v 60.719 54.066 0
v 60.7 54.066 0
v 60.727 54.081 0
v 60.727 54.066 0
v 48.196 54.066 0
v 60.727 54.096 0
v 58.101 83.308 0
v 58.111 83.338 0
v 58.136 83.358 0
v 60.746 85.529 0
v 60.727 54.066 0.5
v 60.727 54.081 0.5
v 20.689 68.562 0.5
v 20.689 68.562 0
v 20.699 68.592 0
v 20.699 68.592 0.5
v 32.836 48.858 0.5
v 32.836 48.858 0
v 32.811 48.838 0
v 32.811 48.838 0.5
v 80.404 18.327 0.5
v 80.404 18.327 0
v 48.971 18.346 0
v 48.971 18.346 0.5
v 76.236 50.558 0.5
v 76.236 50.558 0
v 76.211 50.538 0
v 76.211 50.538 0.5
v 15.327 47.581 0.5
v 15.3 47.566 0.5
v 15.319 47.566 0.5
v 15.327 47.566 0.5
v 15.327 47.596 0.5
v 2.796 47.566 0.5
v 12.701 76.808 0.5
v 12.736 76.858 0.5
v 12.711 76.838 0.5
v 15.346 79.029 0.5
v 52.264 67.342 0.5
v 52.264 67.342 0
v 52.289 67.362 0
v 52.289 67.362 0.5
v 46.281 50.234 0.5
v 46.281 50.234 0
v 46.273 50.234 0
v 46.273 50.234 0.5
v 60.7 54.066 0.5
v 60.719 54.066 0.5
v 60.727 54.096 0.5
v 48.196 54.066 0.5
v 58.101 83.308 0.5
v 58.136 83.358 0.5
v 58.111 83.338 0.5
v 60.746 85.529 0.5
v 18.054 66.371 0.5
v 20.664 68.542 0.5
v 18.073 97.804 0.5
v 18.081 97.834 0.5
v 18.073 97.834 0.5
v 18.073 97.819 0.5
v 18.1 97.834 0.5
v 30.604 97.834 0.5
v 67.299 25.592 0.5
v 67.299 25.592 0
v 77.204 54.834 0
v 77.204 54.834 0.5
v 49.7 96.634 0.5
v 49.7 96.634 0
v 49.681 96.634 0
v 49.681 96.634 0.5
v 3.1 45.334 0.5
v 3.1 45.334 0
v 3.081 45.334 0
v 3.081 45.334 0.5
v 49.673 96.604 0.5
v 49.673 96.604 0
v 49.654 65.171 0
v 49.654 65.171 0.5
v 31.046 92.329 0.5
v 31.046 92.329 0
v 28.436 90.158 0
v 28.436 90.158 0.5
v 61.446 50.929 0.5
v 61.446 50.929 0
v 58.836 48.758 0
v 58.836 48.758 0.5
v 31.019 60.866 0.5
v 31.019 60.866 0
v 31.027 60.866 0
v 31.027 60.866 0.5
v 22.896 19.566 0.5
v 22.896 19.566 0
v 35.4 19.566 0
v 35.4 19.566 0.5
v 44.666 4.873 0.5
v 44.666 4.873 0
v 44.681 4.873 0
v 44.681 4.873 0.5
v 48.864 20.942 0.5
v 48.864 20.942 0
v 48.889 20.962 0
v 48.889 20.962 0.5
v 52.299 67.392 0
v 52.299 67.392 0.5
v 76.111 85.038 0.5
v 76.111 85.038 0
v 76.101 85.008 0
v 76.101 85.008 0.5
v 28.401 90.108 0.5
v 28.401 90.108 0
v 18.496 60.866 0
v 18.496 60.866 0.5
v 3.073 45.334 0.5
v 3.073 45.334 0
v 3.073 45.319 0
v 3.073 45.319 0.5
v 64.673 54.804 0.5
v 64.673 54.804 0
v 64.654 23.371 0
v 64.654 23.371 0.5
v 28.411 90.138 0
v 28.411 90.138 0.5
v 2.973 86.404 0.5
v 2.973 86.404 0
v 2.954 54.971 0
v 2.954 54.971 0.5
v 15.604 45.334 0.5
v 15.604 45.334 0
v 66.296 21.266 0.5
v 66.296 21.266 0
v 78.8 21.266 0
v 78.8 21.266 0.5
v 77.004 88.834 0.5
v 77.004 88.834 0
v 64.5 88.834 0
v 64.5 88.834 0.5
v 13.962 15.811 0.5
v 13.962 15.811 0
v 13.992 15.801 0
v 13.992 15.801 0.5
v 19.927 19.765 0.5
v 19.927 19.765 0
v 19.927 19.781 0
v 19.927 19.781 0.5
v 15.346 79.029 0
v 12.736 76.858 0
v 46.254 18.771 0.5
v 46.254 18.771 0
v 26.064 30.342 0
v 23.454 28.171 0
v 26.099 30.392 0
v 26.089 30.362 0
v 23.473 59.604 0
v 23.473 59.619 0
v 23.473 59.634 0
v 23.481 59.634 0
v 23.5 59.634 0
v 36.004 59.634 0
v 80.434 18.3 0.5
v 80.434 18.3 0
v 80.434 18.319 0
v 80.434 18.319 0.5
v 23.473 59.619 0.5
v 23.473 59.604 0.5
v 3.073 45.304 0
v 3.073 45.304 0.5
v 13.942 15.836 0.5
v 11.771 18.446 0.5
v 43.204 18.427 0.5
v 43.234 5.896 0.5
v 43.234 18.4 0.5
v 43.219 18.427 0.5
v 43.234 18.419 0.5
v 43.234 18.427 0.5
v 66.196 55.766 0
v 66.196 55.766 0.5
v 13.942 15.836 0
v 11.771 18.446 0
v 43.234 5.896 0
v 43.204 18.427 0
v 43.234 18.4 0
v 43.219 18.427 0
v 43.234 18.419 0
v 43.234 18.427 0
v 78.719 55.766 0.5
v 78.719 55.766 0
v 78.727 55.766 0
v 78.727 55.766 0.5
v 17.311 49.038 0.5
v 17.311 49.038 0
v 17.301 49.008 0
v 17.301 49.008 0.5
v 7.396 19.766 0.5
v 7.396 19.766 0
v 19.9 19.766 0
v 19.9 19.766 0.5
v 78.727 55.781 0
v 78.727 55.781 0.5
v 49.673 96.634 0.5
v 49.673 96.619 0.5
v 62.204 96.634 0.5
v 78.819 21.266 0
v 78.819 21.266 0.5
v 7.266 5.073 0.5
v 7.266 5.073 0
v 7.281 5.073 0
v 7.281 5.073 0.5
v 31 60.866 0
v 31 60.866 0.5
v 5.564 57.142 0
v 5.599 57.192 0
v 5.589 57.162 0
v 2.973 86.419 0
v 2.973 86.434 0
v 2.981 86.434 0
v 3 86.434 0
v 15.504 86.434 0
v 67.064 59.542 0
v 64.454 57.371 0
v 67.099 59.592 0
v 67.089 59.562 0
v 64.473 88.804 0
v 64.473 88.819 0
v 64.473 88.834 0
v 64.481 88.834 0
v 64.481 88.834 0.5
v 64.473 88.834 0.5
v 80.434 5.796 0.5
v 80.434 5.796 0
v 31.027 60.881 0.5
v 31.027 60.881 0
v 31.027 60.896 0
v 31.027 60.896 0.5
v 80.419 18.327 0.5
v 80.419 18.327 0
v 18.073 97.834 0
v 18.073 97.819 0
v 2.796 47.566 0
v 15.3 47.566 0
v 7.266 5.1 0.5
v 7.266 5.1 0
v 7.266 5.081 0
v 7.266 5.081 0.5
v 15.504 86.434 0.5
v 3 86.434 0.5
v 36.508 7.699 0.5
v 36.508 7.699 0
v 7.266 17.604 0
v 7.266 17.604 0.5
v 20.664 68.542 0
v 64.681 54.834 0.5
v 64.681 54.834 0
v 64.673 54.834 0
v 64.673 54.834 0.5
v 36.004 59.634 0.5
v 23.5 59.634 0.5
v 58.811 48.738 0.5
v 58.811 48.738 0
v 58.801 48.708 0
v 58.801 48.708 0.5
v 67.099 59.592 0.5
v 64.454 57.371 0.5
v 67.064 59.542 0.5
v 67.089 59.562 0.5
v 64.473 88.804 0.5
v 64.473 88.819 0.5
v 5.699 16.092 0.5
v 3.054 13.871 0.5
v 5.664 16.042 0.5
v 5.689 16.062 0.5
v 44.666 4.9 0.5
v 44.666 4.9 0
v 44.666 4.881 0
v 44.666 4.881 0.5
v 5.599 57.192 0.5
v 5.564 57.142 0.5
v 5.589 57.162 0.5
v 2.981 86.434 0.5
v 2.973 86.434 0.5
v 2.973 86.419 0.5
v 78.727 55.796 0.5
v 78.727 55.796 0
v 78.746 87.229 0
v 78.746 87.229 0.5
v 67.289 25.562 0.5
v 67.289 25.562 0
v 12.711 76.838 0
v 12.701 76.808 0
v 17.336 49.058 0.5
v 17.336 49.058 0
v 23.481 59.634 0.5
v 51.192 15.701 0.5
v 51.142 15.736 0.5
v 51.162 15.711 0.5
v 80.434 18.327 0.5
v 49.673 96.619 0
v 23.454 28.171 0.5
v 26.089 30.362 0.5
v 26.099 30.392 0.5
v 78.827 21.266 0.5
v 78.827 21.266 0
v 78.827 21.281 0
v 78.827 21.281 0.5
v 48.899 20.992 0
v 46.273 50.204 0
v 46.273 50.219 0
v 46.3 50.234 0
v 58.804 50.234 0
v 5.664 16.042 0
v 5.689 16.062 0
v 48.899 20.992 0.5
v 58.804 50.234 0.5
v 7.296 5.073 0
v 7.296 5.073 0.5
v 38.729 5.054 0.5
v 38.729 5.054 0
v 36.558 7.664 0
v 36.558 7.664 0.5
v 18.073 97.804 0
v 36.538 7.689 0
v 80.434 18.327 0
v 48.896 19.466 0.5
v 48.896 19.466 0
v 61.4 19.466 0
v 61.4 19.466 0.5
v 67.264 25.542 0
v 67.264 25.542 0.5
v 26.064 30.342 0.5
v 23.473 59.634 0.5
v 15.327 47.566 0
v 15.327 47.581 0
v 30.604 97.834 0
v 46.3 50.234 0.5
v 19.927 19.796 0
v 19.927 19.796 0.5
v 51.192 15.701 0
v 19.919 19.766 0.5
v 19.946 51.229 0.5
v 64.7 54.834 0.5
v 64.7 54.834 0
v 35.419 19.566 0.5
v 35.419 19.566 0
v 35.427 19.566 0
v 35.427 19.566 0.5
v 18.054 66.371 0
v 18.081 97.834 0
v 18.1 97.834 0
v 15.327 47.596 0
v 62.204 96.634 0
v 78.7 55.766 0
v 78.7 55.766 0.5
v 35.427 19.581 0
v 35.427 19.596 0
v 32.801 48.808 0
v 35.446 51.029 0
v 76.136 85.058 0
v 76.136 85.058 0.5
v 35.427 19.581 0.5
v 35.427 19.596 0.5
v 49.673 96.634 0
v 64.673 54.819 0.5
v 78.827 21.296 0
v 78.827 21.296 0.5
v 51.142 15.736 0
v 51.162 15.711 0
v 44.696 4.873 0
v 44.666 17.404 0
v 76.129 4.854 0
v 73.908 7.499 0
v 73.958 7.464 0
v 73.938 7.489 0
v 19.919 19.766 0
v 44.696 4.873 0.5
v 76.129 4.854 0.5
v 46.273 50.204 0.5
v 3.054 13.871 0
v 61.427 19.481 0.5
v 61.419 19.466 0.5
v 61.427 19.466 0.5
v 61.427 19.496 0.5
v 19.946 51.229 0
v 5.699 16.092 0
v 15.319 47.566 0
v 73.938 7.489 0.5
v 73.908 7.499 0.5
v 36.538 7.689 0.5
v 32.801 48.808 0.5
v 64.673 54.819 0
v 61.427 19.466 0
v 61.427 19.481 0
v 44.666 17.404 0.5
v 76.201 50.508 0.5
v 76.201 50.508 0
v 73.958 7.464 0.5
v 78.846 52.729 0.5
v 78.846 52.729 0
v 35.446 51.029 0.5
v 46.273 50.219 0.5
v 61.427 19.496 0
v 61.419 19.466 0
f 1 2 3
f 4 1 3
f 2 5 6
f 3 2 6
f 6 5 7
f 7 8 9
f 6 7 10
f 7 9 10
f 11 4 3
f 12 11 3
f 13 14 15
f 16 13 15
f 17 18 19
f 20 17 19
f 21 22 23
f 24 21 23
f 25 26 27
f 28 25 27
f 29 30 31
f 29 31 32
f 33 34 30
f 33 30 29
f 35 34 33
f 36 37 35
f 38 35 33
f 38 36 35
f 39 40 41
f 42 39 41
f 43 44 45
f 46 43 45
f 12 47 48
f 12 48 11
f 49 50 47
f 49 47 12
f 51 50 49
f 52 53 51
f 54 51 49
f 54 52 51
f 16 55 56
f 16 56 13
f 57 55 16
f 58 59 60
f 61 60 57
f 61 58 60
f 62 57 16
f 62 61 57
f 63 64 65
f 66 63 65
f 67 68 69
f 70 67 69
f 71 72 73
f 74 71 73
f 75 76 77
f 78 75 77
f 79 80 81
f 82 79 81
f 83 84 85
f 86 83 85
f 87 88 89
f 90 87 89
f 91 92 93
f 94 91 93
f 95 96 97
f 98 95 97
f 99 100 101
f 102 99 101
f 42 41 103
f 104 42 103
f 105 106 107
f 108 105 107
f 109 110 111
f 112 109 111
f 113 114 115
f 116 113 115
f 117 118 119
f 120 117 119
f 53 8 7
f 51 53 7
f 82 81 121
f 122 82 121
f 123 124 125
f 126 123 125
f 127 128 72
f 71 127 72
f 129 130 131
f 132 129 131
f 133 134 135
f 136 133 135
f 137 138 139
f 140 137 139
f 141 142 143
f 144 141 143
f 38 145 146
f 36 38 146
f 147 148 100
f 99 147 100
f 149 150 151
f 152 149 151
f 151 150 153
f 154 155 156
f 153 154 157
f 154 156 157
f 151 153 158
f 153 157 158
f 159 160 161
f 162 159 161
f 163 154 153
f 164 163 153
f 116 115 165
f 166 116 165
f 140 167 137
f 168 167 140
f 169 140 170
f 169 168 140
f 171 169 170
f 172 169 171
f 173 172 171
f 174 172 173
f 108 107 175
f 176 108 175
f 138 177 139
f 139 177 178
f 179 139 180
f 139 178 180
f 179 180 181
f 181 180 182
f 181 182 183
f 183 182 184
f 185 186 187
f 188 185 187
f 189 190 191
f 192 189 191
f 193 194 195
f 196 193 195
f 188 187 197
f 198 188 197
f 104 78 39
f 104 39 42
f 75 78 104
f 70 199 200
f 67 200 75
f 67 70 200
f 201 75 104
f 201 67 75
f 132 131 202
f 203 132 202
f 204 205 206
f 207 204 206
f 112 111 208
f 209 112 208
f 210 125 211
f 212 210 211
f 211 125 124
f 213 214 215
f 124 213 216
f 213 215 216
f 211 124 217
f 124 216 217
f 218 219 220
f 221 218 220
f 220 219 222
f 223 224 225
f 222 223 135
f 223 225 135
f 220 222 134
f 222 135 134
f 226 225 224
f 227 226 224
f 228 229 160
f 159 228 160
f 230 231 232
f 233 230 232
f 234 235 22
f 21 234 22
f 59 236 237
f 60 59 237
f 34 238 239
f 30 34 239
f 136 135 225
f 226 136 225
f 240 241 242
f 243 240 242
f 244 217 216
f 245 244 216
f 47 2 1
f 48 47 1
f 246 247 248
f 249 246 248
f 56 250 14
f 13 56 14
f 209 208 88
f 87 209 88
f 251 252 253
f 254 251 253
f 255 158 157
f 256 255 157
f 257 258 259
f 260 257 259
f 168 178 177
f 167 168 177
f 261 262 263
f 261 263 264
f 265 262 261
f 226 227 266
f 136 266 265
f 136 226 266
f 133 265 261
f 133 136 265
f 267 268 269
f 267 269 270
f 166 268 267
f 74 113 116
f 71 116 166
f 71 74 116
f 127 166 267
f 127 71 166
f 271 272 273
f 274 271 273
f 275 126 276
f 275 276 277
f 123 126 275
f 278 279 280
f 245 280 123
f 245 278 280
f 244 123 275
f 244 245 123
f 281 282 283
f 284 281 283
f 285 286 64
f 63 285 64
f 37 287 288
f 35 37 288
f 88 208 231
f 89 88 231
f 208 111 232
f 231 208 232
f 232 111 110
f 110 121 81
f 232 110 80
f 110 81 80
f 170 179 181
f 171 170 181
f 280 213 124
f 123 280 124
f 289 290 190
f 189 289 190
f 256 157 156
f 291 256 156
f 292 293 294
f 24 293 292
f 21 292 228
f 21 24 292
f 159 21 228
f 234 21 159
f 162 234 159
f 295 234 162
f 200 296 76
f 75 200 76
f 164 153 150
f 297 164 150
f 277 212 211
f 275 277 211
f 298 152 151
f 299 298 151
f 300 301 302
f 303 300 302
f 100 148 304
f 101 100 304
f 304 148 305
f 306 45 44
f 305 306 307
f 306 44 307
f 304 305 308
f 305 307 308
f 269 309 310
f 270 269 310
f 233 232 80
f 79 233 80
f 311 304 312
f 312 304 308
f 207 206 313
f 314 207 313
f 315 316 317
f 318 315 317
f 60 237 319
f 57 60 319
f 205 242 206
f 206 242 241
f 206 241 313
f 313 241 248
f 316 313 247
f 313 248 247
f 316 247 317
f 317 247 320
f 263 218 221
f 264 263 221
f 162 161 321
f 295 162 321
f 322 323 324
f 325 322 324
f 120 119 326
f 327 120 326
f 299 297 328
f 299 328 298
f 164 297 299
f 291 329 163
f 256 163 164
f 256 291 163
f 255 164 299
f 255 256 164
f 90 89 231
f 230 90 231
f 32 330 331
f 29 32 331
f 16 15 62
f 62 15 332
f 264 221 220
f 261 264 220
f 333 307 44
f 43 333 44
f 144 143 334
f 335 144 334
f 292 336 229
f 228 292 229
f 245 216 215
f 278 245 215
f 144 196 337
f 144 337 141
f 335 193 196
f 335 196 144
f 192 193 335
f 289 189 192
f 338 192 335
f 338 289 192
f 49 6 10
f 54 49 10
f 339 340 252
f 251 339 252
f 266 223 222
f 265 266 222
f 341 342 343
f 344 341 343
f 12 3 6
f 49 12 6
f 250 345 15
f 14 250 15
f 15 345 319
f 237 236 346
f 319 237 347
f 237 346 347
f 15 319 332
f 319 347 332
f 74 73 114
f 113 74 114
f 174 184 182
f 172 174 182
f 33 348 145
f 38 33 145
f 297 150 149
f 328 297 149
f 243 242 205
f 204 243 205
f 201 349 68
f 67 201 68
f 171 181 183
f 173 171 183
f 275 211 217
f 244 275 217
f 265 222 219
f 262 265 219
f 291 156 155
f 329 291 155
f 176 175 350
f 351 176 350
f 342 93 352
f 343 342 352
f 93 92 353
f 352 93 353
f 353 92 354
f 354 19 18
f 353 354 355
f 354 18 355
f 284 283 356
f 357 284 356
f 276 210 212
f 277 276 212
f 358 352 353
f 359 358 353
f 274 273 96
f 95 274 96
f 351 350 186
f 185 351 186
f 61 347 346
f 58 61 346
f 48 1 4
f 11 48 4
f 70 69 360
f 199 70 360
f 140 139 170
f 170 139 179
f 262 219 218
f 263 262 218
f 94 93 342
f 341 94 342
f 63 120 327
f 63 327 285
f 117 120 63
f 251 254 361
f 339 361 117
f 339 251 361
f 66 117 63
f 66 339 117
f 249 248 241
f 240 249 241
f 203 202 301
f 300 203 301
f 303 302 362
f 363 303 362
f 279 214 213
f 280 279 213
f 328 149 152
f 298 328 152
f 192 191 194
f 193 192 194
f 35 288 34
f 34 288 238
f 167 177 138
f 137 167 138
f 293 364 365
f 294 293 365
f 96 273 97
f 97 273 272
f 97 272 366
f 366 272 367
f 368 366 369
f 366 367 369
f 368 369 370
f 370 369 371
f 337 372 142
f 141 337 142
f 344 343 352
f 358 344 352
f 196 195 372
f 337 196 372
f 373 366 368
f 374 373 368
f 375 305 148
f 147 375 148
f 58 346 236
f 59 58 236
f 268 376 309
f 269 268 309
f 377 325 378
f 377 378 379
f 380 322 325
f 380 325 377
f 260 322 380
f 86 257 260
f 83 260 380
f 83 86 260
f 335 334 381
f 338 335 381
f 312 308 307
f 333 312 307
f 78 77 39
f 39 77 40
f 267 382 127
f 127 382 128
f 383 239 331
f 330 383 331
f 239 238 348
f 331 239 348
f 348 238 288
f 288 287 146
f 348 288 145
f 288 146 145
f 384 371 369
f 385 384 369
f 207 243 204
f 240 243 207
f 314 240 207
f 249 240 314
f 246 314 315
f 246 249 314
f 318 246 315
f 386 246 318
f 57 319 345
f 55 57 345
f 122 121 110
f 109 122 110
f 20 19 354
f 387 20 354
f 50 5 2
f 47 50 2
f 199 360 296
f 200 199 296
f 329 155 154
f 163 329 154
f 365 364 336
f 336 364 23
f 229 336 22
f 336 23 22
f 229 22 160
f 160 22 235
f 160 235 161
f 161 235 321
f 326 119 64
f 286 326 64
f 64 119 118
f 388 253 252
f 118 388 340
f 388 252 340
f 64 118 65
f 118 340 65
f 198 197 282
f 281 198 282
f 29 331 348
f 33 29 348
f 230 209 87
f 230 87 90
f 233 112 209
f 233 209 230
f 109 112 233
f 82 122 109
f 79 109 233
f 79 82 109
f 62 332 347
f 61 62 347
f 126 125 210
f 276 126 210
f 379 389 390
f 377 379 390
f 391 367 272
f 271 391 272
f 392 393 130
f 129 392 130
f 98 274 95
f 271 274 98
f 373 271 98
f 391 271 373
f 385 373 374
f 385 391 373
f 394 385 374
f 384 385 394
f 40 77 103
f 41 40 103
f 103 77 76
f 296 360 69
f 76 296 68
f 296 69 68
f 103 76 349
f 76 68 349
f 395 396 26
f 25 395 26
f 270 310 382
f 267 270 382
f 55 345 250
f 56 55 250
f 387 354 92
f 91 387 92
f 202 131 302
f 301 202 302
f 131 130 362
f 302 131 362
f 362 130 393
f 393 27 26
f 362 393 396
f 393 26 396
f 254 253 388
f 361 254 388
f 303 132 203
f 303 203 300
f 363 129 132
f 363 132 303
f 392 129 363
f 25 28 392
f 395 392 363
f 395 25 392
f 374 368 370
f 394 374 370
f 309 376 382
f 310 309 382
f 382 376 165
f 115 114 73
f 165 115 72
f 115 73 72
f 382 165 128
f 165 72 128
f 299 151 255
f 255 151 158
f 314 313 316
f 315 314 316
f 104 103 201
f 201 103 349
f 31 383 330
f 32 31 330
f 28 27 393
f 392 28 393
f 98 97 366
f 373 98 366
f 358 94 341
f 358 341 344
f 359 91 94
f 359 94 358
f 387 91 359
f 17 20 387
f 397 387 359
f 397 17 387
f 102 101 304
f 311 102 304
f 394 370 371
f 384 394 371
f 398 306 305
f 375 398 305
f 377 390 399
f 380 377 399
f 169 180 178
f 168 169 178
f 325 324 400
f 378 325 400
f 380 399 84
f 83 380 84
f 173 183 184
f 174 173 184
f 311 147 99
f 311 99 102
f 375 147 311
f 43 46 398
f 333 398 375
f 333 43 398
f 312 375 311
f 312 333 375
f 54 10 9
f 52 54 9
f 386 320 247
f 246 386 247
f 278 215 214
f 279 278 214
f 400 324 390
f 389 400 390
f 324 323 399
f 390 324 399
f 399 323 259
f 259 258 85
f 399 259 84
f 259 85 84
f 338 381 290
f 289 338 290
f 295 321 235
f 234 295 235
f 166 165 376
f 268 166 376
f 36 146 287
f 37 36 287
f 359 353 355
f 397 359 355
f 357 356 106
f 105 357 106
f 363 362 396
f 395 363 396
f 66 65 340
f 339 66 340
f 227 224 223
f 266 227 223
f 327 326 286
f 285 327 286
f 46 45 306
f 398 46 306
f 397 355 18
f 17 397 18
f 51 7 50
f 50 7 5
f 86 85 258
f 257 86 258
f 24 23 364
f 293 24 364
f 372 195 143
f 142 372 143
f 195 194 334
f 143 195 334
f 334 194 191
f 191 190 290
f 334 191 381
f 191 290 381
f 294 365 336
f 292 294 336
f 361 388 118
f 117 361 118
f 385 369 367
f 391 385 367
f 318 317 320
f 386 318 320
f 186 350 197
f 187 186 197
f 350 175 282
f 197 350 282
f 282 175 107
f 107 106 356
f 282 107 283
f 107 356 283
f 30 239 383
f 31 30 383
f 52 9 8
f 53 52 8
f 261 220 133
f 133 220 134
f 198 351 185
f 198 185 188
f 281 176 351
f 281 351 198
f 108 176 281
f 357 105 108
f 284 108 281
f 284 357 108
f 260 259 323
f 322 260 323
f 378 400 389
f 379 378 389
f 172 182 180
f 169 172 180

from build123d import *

# Parameters (mm, degrees)
BOSS_EXTRUDE1_DEPTH    = 0.5
BOSS_EXTRUDE1_2_DEPTH  = 0.5
BOSS_EXTRUDE1_3_DEPTH  = 0.5
BOSS_EXTRUDE1_4_DEPTH  = 0.5
BOSS_EXTRUDE1_5_DEPTH  = 0.5
BOSS_EXTRUDE1_6_DEPTH  = 0.5
BOSS_EXTRUDE1_7_DEPTH  = 0.5
BOSS_EXTRUDE1_8_DEPTH  = 0.5
BOSS_EXTRUDE1_9_DEPTH  = 0.5
BOSS_EXTRUDE1_10_DEPTH = 0.5
BOSS_EXTRUDE1_11_DEPTH = 0.5
BOSS_EXTRUDE1_12_DEPTH = 0.5
BOSS_EXTRUDE1_13_DEPTH = 0.5
BOSS_EXTRUDE1_14_DEPTH = 0.5
BOSS_EXTRUDE1_15_DEPTH = 0.5
BOSS_EXTRUDE1_16_DEPTH = 0.5
BOSS_EXTRUDE1_17_DEPTH = 0.5
BOSS_EXTRUDE1_18_DEPTH = 0.5
BOSS_EXTRUDE1_19_DEPTH = 0.5
BOSS_EXTRUDE1_20_DEPTH = 0.5


with BuildPart() as part:
    # Model → Boss-Extrude1 (new body)
    with BuildSketch(Plane.XY):
        Polygon((18.0727, 97.8343), (18.0727, 97.8187), (18.072691244, 97.803735595), (18.0543, 66.371), (20.664165109, 68.54157794), (20.6886, 68.5619), (20.698783041, 68.591962529), (30.6039, 97.834), (18.100296093, 97.83429954), (18.0811, 97.8343), align=None)
    extrude(amount=BOSS_EXTRUDE1_DEPTH)


with BuildPart() as body_2:
    # Model → Boss-Extrude1 2 (new body)
    with BuildSketch(Plane.XY):
        Polygon((31.0273, 60.8657), (31.0273, 60.8813), (31.027308756, 60.896264405), (31.0457, 92.329), (28.435834891, 90.15842206), (28.4114, 90.1381), (28.401216959, 90.108037471), (18.4961, 60.866), (30.999703907, 60.86570046), (31.0189, 60.8657), align=None)
    extrude(amount=BOSS_EXTRUDE1_2_DEPTH)


with BuildPart() as body_3:
    # Model → Boss-Extrude1 3 (new body)
    with BuildSketch(Plane.XY):
        Polygon((2.9727, 86.4343), (2.9727, 86.4187), (2.972691244, 86.403735595), (2.9543, 54.971), (5.564165109, 57.14157794), (5.5886, 57.1619), (5.598783041, 57.191962529), (15.5039, 86.434), (3.000296093, 86.43429954), (2.9811, 86.4343), align=None)
    extrude(amount=BOSS_EXTRUDE1_3_DEPTH)


with BuildPart() as body_4:
    # Model → Boss-Extrude1 4 (new body)
    with BuildSketch(Plane.XY):
        Polygon((15.3273, 47.5657), (15.3273, 47.5813), (15.327308756, 47.596264405), (15.3457, 79.029), (12.735834891, 76.85842206), (12.7114, 76.8381), (12.701216959, 76.808037471), (2.7961, 47.566), (15.299703907, 47.56570046), (15.3189, 47.5657), align=None)
    extrude(amount=BOSS_EXTRUDE1_4_DEPTH)


with BuildPart() as body_5:
    # Model → Boss-Extrude1 5 (new body)
    with BuildSketch(Plane.XY):
        Polygon((23.4727, 59.6343), (23.4727, 59.6187), (23.472691244, 59.603735595), (23.4543, 28.171), (26.064165109, 30.34157794), (26.0886, 30.3619), (26.098783041, 30.391962529), (36.0039, 59.634), (23.500296093, 59.63429954), (23.4811, 59.6343), align=None)
    extrude(amount=BOSS_EXTRUDE1_5_DEPTH)


with BuildPart() as body_6:
    # Model → Boss-Extrude1 6 (new body)
    with BuildSketch(Plane.XY):
        Polygon((35.4273, 19.5657), (35.4273, 19.5813), (35.427308756, 19.596264405), (35.4457, 51.029), (32.835834891, 48.85842206), (32.8114, 48.8381), (32.801216959, 48.808037471), (22.8961, 19.566), (35.399703907, 19.56570046), (35.4189, 19.5657), align=None)
    extrude(amount=BOSS_EXTRUDE1_6_DEPTH)


with BuildPart() as body_7:
    # Model → Boss-Extrude1 7 (new body)
    with BuildSketch(Plane.XY):
        Polygon((19.9273, 19.765388081), (19.9273, 19.7813), (19.927308756, 19.796264405), (19.9457, 51.229), (17.335834891, 49.05842206), (17.3114, 49.0381), (17.301216959, 49.008037471), (7.3961, 19.766), (19.899703907, 19.76570046), (19.9189, 19.7657), align=None)
    extrude(amount=BOSS_EXTRUDE1_7_DEPTH)


with BuildPart() as body_8:
    # Model → Boss-Extrude1 8 (new body)
    with BuildSketch(Plane.XY):
        Polygon((3.0727, 45.3343), (3.0727, 45.3187), (3.072691244, 45.303735595), (3.0543, 13.871), (5.664165109, 16.04157794), (5.6886, 16.0619), (5.698783041, 16.091962529), (15.6039, 45.334), (3.100296093, 45.33429954), (3.0811, 45.3343), align=None)
    extrude(amount=BOSS_EXTRUDE1_8_DEPTH)


with BuildPart() as body_9:
    # Model → Boss-Extrude1 9 (new body)
    with BuildSketch(Plane.XY):
        Polygon((43.2343, 18.4273), (43.2187, 18.4273), (43.203735595, 18.427308756), (11.771, 18.4457), (13.94157794, 15.835834891), (13.9619, 15.8114), (13.991962529, 15.801216959), (43.234, 5.8961), (43.23429954, 18.399703907), (43.2343, 18.4189), align=None)
    extrude(amount=BOSS_EXTRUDE1_9_DEPTH)


with BuildPart() as body_10:
    # Model → Boss-Extrude1 10 (new body)
    with BuildSketch(Plane.XY):
        Polygon((7.2657, 5.0727), (7.2813, 5.0727), (7.296264405, 5.072691244), (38.729, 5.0543), (36.55842206, 7.664165109), (36.5381, 7.6886), (36.508037471, 7.698783041), (7.266, 17.6039), (7.26570046, 5.100296093), (7.2657, 5.0811), align=None)
    extrude(amount=BOSS_EXTRUDE1_10_DEPTH)


with BuildPart() as body_11:
    # Model → Boss-Extrude1 11 (new body)
    with BuildSketch(Plane.XY):
        Polygon((49.6727, 96.6343), (49.6727, 96.6187), (49.672691244, 96.603735595), (49.6543, 65.171), (52.264165109, 67.34157794), (52.2886, 67.3619), (52.298783041, 67.391962529), (62.2039, 96.634), (49.700296093, 96.63429954), (49.6811, 96.6343), align=None)
    extrude(amount=BOSS_EXTRUDE1_11_DEPTH)


with BuildPart() as body_12:
    # Model → Boss-Extrude1 12 (new body)
    with BuildSketch(Plane.XY):
        Polygon((60.7273, 54.0657), (60.7273, 54.0813), (60.727308756, 54.096264405), (60.7457, 85.529), (58.135834891, 83.35842206), (58.1114, 83.3381), (58.101216959, 83.308037471), (48.1961, 54.066), (60.699703907, 54.06570046), (60.7189, 54.0657), align=None)
    extrude(amount=BOSS_EXTRUDE1_12_DEPTH)


with BuildPart() as body_13:
    # Model → Boss-Extrude1 13 (new body)
    with BuildSketch(Plane.XY):
        Polygon((64.4727, 88.8343), (64.4727, 88.8187), (64.472691244, 88.803735595), (64.4543, 57.371), (67.064165109, 59.54157794), (67.0886, 59.5619), (67.098783041, 59.591962529), (77.0039, 88.834), (64.500296093, 88.83429954), (64.4811, 88.8343), align=None)
    extrude(amount=BOSS_EXTRUDE1_13_DEPTH)


with BuildPart() as body_14:
    # Model → Boss-Extrude1 14 (new body)
    with BuildSketch(Plane.XY):
        Polygon((78.7273, 55.7657), (78.7273, 55.7813), (78.727308756, 55.796264405), (78.7457, 87.229), (76.135834891, 85.05842206), (76.1114, 85.0381), (76.101216959, 85.008037471), (66.1961, 55.766), (78.699703907, 55.76570046), (78.7189, 55.7657), align=None)
    extrude(amount=BOSS_EXTRUDE1_14_DEPTH)


with BuildPart() as body_15:
    # Model → Boss-Extrude1 15 (new body)
    with BuildSketch(Plane.XY):
        Polygon((64.6727, 54.8343), (64.6727, 54.8187), (64.672691244, 54.803735595), (64.6543, 23.371), (67.264165109, 25.54157794), (67.2886, 25.5619), (67.298783041, 25.591962529), (77.2039, 54.834), (64.700296093, 54.83429954), (64.6811, 54.8343), align=None)
    extrude(amount=BOSS_EXTRUDE1_15_DEPTH)


with BuildPart() as body_16:
    # Model → Boss-Extrude1 16 (new body)
    with BuildSketch(Plane.XY):
        Polygon((78.8273, 21.2657), (78.8273, 21.2813), (78.827308756, 21.296264405), (78.8457, 52.729), (76.235834891, 50.55842206), (76.2114, 50.5381), (76.201216959, 50.508037471), (66.2961, 21.266), (78.799703907, 21.26570046), (78.8189, 21.2657), align=None)
    extrude(amount=BOSS_EXTRUDE1_16_DEPTH)


with BuildPart() as body_17:
    # Model → Boss-Extrude1 17 (new body)
    with BuildSketch(Plane.XY):
        Polygon((61.4273, 19.4657), (61.4273, 19.4813), (61.427308756, 19.496264405), (61.4457, 50.929), (58.835834891, 48.75842206), (58.8114, 48.7381), (58.801216959, 48.708037471), (48.8961, 19.466), (61.399703907, 19.46570046), (61.4189, 19.4657), align=None)
    extrude(amount=BOSS_EXTRUDE1_17_DEPTH)


with BuildPart() as body_18:
    # Model → Boss-Extrude1 18 (new body)
    with BuildSketch(Plane.XY):
        Polygon((46.2727, 50.2343), (46.2727, 50.2187), (46.272691244, 50.203735595), (46.2543, 18.771), (48.864165109, 20.94157794), (48.8886, 20.9619), (48.898783041, 20.991962529), (58.8039, 50.234), (46.300296093, 50.23429954), (46.2811, 50.2343), align=None)
    extrude(amount=BOSS_EXTRUDE1_18_DEPTH)


with BuildPart() as body_19:
    # Model → Boss-Extrude1 19 (new body)
    with BuildSketch(Plane.XY):
        Polygon((80.4343, 18.3273), (80.4187, 18.3273), (80.403735595, 18.327308756), (48.971, 18.3457), (51.14157794, 15.735834891), (51.1619, 15.7114), (51.191962529, 15.701216959), (80.434, 5.7961), (80.43429954, 18.299703907), (80.4343, 18.3189), align=None)
    extrude(amount=BOSS_EXTRUDE1_19_DEPTH)


with BuildPart() as body_20:
    # Model → Boss-Extrude1 20 (new body)
    with BuildSketch(Plane.XY):
        Polygon((44.6657, 4.8727), (44.6813, 4.8727), (44.696264405, 4.872691244), (76.129, 4.8543), (73.95842206, 7.464165109), (73.9381, 7.4886), (73.908037471, 7.498783041), (44.666, 17.4039), (44.66570046, 4.900296093), (44.6657, 4.8811), align=None)
    extrude(amount=BOSS_EXTRUDE1_20_DEPTH)


solid = Compound([part.part, body_2.part, body_3.part, body_4.part, body_5.part, body_6.part, body_7.part, body_8.part, body_9.part, body_10.part, body_11.part, body_12.part, body_13.part, body_14.part, body_15.part, body_16.part, body_17.part, body_18.part, body_19.part, body_20.part])
